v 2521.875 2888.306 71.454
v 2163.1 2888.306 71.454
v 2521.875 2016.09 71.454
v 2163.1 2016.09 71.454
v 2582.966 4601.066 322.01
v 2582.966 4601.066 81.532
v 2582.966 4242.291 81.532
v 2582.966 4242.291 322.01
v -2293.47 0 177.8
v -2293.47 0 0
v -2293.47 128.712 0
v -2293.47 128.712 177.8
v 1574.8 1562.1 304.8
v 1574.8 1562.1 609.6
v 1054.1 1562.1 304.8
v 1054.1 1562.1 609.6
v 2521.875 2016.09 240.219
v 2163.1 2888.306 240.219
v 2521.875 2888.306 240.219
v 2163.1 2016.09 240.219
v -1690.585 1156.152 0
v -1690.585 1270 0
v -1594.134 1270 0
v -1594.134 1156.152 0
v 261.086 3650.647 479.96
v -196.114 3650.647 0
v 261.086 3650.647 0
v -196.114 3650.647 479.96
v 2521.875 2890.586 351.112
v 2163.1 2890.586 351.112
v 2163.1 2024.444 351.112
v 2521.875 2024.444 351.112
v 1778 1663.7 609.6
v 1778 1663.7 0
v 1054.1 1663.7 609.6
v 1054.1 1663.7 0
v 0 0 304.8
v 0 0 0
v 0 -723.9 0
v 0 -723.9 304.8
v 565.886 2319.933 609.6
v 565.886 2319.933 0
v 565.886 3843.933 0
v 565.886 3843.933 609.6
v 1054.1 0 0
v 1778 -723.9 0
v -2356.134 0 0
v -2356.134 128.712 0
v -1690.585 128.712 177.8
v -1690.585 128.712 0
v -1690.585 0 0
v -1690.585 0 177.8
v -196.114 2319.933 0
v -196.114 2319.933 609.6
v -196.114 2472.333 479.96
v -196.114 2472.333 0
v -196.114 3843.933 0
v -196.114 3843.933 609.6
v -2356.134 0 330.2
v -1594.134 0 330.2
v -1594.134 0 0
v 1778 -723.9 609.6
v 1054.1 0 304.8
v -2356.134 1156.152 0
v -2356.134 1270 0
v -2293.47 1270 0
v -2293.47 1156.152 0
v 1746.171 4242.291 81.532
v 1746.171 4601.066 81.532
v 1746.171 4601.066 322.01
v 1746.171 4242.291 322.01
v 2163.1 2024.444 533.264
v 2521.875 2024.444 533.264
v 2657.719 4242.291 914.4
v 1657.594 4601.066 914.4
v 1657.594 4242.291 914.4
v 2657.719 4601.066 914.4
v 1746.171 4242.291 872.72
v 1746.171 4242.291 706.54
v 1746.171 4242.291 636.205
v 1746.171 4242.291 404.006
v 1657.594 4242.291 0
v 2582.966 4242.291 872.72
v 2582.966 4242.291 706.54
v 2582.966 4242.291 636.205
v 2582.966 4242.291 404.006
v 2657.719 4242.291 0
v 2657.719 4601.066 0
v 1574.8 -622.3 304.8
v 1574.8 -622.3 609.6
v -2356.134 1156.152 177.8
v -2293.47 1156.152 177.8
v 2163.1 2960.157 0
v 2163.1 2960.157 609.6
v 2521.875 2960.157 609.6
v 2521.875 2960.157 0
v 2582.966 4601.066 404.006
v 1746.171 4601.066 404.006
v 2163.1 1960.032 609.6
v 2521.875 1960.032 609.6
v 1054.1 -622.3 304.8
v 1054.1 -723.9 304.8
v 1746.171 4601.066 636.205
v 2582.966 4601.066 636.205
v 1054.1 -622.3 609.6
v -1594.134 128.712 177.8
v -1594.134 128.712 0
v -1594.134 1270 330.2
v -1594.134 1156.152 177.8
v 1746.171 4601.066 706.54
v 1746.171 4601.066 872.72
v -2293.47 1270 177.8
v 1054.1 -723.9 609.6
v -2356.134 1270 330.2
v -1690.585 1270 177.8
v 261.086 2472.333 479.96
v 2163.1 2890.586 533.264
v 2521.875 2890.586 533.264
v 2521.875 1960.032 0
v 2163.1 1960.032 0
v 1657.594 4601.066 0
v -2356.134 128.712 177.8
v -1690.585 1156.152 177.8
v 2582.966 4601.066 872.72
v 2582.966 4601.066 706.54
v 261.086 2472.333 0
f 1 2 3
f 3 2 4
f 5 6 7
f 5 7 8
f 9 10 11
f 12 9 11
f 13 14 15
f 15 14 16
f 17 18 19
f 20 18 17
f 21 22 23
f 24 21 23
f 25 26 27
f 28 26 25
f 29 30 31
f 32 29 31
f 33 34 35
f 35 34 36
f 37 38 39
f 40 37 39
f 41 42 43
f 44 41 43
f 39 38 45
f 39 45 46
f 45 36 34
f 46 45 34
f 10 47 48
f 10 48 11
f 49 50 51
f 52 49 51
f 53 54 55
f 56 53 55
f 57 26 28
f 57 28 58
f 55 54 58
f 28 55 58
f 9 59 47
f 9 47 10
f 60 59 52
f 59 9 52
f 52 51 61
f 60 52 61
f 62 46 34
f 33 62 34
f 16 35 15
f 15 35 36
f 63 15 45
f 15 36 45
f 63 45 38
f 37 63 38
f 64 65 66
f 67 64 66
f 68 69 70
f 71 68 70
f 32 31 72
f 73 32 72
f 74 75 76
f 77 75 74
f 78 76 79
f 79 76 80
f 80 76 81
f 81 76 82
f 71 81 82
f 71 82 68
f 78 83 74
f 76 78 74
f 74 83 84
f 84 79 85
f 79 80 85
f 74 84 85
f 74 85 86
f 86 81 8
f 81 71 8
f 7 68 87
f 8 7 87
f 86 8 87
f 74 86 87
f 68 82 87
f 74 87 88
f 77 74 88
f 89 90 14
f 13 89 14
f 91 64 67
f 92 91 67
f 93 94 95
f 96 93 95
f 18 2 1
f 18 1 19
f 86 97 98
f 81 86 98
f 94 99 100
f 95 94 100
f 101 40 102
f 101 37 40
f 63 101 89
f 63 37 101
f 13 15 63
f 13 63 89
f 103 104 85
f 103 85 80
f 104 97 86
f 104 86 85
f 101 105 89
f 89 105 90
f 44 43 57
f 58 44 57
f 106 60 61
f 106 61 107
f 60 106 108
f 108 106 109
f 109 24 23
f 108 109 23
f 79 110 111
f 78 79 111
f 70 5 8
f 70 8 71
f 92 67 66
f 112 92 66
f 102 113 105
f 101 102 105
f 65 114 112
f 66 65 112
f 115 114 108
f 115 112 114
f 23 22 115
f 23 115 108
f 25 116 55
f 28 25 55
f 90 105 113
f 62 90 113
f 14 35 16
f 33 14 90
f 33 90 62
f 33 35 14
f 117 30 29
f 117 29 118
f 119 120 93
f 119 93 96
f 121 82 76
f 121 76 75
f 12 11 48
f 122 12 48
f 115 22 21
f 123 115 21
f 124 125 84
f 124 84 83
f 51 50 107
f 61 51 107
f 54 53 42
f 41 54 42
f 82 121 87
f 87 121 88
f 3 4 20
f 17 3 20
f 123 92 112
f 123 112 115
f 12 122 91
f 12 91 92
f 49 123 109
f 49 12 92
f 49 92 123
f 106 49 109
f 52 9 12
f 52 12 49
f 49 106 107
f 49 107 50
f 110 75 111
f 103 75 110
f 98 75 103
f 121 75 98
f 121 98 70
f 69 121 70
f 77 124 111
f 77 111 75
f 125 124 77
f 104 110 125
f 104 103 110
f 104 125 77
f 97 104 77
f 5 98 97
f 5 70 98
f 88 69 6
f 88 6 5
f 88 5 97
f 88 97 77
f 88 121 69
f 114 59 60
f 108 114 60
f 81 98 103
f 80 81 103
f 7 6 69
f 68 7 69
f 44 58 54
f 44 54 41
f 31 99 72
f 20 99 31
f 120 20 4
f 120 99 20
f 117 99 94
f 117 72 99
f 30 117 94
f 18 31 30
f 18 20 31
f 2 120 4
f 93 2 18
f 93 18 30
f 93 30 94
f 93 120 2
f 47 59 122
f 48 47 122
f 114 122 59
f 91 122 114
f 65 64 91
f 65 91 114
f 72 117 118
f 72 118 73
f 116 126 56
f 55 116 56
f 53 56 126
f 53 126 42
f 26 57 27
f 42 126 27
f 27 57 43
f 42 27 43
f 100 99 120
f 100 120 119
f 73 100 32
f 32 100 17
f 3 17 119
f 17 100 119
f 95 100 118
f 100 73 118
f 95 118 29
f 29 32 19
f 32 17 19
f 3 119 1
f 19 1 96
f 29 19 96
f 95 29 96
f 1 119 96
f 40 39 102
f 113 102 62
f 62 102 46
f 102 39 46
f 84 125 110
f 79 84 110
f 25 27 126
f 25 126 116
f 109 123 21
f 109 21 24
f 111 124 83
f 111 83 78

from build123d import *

# Parameters (mm, degrees)
F1_DEPTH  = 609.6
F3_DEPTH  = 304.8
F4_W      = 762
F4_H      = 1270
F5_DEPTH  = 330.2
F7_DEPTH  = 177.8
F9_DEPTH  = 609.6
F10_W     = 771.914303
F10_H     = 479.959786
F11_DEPTH = 457.2
F12_W     = 770.775476
F12_H     = 479.959786
F13_DEPTH = 406.4
F14_W     = 1000.125
F14_H     = 358.775
F15_DEPTH = 914.4
F16_W     = 836.795569
F16_H     = 240.478024
F16_H_2   = 232.198417
F16_H_3   = 166.179598
F17_DEPTH = 381
F18_W     = 358.775
F18_H     = 1000.125
F19_DEPTH = 609.6
F20_W     = 866.14275
F20_H     = 182.152093
F20_W_2   = 872.215271
F20_H_2   = 168.765642
F21_DEPTH = 381
F22_W     = 863.6
F22_H     = 558.8
F23_DEPTH = 609.601


with BuildPart() as f1:
    # F0 (on Top) → F1 (new body)
    with BuildSketch(Plane.XY):
        Polygon((1054.1, 0), (0, 0), (0, -723.9), (1778, -723.9), (1778, 1663.7), (1054.1, 1663.7), align=None)
    extrude(amount=F1_DEPTH)

    # F2 (on face) → F3 (cut)
    with BuildSketch(Plane.XY.offset(609.6)):
        Polygon((0, -723.9), (1054.1, -723.9), (1054.1, -622.3), (1574.8, -622.3), (1574.8, 1562.1), (1054.1, 1562.1), (1054.1, 0), (0, 0), align=None)
    extrude(amount=-F3_DEPTH, mode=Mode.SUBTRACT)


with BuildPart() as f5:
    # F4 (on Top) → F5 (new body)
    with BuildSketch(Plane.XY):
        with Locations((-1975.134279, 635)):
            Rectangle(F4_W, F4_H)
    extrude(amount=F5_DEPTH)

    # F6 (on face) → F7 (cut)
    with BuildSketch(Plane(origin=(0, 0, 0), x_dir=(1, 0, 0), z_dir=(0, 0, -1))):
        Polygon((-1594.134279, -1156.151891), (-1594.134279, -128.711686), (-1690.585136, -128.711686), (-1690.585136, 0), (-2293.469667, 0), (-2293.469667, -128.711686), (-2356.134279, -128.711686), (-2356.134279, -1156.151891), (-2293.469667, -1156.151891), (-2293.469667, -1270), (-1690.585136, -1270), (-1690.585136, -1156.151891), align=None)
    extrude(amount=-F7_DEPTH, mode=Mode.SUBTRACT)


with BuildPart() as f9:
    # F8 (on Top) → F9 (new body)
    with BuildSketch(Plane.XY):
        Polygon((-1059.714213, 2319.93286), (565.885787, 2319.93286), (565.885787, 3843.93286), (-196.114213, 3843.93286), (-196.114213, 2878.73286), (-1059.714213, 2878.73286), align=None)
    extrude(amount=F9_DEPTH)

    # F10 (on face) → F11 (cut)
    with BuildSketch(Plane(origin=(-196.114213, 0, 0), x_dir=(0, -1, 0), z_dir=(-1, 0, 0))):
        with Locations((-3264.690011, 239.979893)):
            Rectangle(F10_W, F10_H)
    extrude(amount=-F11_DEPTH, mode=Mode.SUBTRACT)

    # F12 (on face) → F13 (cut)
    with BuildSketch(Plane(origin=(0, 2878.73286, 0), x_dir=(-1, 0, 0), z_dir=(0, 1, 0))):
        with Locations((124.301951, 239.979893)):
            Rectangle(F12_W, F12_H)
    extrude(amount=-F13_DEPTH, mode=Mode.SUBTRACT)

    # F22 (on face) → F23 (cut, through all)
    with BuildSketch(Plane.XY.offset(609.6)):
        with Locations((-627.914213, 2599.33286)):
            Rectangle(F22_W, F22_H)
    extrude(amount=-F23_DEPTH, mode=Mode.SUBTRACT)


with BuildPart() as f15:
    # F14 (on Top) → F15 (new body)
    with BuildSketch(Plane.XY):
        with Locations((2157.65655, 4421.678798)):
            Rectangle(F14_W, F14_H)
    extrude(amount=F15_DEPTH)

    # F16 (on face) → F17 (cut)
    with BuildSketch(Plane(origin=(0, 4601.066298, 0), x_dir=(-1, 0, 0), z_dir=(0, 1, 0))):
        with Locations((-2164.568544, 201.77076)):
            Rectangle(F16_W, F16_H)
        with Locations((-2164.568544, 520.105391)):
            Rectangle(F16_W, F16_H_2)
        with Locations((-2164.568544, 789.629966)):
            Rectangle(F16_W, F16_H_3)
    extrude(amount=-F17_DEPTH, mode=Mode.SUBTRACT)


with BuildPart() as f19:
    # F18 (on Top) → F19 (new body)
    with BuildSketch(Plane.XY):
        with Locations((2342.487979, 2460.094988)):
            Rectangle(F18_W, F18_H)
    extrude(amount=F19_DEPTH)

    # F20 (on face) → F21 (cut)
    with BuildSketch(Plane(origin=(2163.100479, 0, 0), x_dir=(0, -1, 0), z_dir=(-1, 0, 0))):
        with Locations((-2457.515001, 442.187756)):
            Rectangle(F20_W, F20_H)
        with Locations((-2452.198028, 155.836668)):
            Rectangle(F20_W_2, F20_H_2)
    extrude(amount=-F21_DEPTH, mode=Mode.SUBTRACT)


solid = Compound([f1.part, f5.part, f9.part, f15.part, f19.part])
